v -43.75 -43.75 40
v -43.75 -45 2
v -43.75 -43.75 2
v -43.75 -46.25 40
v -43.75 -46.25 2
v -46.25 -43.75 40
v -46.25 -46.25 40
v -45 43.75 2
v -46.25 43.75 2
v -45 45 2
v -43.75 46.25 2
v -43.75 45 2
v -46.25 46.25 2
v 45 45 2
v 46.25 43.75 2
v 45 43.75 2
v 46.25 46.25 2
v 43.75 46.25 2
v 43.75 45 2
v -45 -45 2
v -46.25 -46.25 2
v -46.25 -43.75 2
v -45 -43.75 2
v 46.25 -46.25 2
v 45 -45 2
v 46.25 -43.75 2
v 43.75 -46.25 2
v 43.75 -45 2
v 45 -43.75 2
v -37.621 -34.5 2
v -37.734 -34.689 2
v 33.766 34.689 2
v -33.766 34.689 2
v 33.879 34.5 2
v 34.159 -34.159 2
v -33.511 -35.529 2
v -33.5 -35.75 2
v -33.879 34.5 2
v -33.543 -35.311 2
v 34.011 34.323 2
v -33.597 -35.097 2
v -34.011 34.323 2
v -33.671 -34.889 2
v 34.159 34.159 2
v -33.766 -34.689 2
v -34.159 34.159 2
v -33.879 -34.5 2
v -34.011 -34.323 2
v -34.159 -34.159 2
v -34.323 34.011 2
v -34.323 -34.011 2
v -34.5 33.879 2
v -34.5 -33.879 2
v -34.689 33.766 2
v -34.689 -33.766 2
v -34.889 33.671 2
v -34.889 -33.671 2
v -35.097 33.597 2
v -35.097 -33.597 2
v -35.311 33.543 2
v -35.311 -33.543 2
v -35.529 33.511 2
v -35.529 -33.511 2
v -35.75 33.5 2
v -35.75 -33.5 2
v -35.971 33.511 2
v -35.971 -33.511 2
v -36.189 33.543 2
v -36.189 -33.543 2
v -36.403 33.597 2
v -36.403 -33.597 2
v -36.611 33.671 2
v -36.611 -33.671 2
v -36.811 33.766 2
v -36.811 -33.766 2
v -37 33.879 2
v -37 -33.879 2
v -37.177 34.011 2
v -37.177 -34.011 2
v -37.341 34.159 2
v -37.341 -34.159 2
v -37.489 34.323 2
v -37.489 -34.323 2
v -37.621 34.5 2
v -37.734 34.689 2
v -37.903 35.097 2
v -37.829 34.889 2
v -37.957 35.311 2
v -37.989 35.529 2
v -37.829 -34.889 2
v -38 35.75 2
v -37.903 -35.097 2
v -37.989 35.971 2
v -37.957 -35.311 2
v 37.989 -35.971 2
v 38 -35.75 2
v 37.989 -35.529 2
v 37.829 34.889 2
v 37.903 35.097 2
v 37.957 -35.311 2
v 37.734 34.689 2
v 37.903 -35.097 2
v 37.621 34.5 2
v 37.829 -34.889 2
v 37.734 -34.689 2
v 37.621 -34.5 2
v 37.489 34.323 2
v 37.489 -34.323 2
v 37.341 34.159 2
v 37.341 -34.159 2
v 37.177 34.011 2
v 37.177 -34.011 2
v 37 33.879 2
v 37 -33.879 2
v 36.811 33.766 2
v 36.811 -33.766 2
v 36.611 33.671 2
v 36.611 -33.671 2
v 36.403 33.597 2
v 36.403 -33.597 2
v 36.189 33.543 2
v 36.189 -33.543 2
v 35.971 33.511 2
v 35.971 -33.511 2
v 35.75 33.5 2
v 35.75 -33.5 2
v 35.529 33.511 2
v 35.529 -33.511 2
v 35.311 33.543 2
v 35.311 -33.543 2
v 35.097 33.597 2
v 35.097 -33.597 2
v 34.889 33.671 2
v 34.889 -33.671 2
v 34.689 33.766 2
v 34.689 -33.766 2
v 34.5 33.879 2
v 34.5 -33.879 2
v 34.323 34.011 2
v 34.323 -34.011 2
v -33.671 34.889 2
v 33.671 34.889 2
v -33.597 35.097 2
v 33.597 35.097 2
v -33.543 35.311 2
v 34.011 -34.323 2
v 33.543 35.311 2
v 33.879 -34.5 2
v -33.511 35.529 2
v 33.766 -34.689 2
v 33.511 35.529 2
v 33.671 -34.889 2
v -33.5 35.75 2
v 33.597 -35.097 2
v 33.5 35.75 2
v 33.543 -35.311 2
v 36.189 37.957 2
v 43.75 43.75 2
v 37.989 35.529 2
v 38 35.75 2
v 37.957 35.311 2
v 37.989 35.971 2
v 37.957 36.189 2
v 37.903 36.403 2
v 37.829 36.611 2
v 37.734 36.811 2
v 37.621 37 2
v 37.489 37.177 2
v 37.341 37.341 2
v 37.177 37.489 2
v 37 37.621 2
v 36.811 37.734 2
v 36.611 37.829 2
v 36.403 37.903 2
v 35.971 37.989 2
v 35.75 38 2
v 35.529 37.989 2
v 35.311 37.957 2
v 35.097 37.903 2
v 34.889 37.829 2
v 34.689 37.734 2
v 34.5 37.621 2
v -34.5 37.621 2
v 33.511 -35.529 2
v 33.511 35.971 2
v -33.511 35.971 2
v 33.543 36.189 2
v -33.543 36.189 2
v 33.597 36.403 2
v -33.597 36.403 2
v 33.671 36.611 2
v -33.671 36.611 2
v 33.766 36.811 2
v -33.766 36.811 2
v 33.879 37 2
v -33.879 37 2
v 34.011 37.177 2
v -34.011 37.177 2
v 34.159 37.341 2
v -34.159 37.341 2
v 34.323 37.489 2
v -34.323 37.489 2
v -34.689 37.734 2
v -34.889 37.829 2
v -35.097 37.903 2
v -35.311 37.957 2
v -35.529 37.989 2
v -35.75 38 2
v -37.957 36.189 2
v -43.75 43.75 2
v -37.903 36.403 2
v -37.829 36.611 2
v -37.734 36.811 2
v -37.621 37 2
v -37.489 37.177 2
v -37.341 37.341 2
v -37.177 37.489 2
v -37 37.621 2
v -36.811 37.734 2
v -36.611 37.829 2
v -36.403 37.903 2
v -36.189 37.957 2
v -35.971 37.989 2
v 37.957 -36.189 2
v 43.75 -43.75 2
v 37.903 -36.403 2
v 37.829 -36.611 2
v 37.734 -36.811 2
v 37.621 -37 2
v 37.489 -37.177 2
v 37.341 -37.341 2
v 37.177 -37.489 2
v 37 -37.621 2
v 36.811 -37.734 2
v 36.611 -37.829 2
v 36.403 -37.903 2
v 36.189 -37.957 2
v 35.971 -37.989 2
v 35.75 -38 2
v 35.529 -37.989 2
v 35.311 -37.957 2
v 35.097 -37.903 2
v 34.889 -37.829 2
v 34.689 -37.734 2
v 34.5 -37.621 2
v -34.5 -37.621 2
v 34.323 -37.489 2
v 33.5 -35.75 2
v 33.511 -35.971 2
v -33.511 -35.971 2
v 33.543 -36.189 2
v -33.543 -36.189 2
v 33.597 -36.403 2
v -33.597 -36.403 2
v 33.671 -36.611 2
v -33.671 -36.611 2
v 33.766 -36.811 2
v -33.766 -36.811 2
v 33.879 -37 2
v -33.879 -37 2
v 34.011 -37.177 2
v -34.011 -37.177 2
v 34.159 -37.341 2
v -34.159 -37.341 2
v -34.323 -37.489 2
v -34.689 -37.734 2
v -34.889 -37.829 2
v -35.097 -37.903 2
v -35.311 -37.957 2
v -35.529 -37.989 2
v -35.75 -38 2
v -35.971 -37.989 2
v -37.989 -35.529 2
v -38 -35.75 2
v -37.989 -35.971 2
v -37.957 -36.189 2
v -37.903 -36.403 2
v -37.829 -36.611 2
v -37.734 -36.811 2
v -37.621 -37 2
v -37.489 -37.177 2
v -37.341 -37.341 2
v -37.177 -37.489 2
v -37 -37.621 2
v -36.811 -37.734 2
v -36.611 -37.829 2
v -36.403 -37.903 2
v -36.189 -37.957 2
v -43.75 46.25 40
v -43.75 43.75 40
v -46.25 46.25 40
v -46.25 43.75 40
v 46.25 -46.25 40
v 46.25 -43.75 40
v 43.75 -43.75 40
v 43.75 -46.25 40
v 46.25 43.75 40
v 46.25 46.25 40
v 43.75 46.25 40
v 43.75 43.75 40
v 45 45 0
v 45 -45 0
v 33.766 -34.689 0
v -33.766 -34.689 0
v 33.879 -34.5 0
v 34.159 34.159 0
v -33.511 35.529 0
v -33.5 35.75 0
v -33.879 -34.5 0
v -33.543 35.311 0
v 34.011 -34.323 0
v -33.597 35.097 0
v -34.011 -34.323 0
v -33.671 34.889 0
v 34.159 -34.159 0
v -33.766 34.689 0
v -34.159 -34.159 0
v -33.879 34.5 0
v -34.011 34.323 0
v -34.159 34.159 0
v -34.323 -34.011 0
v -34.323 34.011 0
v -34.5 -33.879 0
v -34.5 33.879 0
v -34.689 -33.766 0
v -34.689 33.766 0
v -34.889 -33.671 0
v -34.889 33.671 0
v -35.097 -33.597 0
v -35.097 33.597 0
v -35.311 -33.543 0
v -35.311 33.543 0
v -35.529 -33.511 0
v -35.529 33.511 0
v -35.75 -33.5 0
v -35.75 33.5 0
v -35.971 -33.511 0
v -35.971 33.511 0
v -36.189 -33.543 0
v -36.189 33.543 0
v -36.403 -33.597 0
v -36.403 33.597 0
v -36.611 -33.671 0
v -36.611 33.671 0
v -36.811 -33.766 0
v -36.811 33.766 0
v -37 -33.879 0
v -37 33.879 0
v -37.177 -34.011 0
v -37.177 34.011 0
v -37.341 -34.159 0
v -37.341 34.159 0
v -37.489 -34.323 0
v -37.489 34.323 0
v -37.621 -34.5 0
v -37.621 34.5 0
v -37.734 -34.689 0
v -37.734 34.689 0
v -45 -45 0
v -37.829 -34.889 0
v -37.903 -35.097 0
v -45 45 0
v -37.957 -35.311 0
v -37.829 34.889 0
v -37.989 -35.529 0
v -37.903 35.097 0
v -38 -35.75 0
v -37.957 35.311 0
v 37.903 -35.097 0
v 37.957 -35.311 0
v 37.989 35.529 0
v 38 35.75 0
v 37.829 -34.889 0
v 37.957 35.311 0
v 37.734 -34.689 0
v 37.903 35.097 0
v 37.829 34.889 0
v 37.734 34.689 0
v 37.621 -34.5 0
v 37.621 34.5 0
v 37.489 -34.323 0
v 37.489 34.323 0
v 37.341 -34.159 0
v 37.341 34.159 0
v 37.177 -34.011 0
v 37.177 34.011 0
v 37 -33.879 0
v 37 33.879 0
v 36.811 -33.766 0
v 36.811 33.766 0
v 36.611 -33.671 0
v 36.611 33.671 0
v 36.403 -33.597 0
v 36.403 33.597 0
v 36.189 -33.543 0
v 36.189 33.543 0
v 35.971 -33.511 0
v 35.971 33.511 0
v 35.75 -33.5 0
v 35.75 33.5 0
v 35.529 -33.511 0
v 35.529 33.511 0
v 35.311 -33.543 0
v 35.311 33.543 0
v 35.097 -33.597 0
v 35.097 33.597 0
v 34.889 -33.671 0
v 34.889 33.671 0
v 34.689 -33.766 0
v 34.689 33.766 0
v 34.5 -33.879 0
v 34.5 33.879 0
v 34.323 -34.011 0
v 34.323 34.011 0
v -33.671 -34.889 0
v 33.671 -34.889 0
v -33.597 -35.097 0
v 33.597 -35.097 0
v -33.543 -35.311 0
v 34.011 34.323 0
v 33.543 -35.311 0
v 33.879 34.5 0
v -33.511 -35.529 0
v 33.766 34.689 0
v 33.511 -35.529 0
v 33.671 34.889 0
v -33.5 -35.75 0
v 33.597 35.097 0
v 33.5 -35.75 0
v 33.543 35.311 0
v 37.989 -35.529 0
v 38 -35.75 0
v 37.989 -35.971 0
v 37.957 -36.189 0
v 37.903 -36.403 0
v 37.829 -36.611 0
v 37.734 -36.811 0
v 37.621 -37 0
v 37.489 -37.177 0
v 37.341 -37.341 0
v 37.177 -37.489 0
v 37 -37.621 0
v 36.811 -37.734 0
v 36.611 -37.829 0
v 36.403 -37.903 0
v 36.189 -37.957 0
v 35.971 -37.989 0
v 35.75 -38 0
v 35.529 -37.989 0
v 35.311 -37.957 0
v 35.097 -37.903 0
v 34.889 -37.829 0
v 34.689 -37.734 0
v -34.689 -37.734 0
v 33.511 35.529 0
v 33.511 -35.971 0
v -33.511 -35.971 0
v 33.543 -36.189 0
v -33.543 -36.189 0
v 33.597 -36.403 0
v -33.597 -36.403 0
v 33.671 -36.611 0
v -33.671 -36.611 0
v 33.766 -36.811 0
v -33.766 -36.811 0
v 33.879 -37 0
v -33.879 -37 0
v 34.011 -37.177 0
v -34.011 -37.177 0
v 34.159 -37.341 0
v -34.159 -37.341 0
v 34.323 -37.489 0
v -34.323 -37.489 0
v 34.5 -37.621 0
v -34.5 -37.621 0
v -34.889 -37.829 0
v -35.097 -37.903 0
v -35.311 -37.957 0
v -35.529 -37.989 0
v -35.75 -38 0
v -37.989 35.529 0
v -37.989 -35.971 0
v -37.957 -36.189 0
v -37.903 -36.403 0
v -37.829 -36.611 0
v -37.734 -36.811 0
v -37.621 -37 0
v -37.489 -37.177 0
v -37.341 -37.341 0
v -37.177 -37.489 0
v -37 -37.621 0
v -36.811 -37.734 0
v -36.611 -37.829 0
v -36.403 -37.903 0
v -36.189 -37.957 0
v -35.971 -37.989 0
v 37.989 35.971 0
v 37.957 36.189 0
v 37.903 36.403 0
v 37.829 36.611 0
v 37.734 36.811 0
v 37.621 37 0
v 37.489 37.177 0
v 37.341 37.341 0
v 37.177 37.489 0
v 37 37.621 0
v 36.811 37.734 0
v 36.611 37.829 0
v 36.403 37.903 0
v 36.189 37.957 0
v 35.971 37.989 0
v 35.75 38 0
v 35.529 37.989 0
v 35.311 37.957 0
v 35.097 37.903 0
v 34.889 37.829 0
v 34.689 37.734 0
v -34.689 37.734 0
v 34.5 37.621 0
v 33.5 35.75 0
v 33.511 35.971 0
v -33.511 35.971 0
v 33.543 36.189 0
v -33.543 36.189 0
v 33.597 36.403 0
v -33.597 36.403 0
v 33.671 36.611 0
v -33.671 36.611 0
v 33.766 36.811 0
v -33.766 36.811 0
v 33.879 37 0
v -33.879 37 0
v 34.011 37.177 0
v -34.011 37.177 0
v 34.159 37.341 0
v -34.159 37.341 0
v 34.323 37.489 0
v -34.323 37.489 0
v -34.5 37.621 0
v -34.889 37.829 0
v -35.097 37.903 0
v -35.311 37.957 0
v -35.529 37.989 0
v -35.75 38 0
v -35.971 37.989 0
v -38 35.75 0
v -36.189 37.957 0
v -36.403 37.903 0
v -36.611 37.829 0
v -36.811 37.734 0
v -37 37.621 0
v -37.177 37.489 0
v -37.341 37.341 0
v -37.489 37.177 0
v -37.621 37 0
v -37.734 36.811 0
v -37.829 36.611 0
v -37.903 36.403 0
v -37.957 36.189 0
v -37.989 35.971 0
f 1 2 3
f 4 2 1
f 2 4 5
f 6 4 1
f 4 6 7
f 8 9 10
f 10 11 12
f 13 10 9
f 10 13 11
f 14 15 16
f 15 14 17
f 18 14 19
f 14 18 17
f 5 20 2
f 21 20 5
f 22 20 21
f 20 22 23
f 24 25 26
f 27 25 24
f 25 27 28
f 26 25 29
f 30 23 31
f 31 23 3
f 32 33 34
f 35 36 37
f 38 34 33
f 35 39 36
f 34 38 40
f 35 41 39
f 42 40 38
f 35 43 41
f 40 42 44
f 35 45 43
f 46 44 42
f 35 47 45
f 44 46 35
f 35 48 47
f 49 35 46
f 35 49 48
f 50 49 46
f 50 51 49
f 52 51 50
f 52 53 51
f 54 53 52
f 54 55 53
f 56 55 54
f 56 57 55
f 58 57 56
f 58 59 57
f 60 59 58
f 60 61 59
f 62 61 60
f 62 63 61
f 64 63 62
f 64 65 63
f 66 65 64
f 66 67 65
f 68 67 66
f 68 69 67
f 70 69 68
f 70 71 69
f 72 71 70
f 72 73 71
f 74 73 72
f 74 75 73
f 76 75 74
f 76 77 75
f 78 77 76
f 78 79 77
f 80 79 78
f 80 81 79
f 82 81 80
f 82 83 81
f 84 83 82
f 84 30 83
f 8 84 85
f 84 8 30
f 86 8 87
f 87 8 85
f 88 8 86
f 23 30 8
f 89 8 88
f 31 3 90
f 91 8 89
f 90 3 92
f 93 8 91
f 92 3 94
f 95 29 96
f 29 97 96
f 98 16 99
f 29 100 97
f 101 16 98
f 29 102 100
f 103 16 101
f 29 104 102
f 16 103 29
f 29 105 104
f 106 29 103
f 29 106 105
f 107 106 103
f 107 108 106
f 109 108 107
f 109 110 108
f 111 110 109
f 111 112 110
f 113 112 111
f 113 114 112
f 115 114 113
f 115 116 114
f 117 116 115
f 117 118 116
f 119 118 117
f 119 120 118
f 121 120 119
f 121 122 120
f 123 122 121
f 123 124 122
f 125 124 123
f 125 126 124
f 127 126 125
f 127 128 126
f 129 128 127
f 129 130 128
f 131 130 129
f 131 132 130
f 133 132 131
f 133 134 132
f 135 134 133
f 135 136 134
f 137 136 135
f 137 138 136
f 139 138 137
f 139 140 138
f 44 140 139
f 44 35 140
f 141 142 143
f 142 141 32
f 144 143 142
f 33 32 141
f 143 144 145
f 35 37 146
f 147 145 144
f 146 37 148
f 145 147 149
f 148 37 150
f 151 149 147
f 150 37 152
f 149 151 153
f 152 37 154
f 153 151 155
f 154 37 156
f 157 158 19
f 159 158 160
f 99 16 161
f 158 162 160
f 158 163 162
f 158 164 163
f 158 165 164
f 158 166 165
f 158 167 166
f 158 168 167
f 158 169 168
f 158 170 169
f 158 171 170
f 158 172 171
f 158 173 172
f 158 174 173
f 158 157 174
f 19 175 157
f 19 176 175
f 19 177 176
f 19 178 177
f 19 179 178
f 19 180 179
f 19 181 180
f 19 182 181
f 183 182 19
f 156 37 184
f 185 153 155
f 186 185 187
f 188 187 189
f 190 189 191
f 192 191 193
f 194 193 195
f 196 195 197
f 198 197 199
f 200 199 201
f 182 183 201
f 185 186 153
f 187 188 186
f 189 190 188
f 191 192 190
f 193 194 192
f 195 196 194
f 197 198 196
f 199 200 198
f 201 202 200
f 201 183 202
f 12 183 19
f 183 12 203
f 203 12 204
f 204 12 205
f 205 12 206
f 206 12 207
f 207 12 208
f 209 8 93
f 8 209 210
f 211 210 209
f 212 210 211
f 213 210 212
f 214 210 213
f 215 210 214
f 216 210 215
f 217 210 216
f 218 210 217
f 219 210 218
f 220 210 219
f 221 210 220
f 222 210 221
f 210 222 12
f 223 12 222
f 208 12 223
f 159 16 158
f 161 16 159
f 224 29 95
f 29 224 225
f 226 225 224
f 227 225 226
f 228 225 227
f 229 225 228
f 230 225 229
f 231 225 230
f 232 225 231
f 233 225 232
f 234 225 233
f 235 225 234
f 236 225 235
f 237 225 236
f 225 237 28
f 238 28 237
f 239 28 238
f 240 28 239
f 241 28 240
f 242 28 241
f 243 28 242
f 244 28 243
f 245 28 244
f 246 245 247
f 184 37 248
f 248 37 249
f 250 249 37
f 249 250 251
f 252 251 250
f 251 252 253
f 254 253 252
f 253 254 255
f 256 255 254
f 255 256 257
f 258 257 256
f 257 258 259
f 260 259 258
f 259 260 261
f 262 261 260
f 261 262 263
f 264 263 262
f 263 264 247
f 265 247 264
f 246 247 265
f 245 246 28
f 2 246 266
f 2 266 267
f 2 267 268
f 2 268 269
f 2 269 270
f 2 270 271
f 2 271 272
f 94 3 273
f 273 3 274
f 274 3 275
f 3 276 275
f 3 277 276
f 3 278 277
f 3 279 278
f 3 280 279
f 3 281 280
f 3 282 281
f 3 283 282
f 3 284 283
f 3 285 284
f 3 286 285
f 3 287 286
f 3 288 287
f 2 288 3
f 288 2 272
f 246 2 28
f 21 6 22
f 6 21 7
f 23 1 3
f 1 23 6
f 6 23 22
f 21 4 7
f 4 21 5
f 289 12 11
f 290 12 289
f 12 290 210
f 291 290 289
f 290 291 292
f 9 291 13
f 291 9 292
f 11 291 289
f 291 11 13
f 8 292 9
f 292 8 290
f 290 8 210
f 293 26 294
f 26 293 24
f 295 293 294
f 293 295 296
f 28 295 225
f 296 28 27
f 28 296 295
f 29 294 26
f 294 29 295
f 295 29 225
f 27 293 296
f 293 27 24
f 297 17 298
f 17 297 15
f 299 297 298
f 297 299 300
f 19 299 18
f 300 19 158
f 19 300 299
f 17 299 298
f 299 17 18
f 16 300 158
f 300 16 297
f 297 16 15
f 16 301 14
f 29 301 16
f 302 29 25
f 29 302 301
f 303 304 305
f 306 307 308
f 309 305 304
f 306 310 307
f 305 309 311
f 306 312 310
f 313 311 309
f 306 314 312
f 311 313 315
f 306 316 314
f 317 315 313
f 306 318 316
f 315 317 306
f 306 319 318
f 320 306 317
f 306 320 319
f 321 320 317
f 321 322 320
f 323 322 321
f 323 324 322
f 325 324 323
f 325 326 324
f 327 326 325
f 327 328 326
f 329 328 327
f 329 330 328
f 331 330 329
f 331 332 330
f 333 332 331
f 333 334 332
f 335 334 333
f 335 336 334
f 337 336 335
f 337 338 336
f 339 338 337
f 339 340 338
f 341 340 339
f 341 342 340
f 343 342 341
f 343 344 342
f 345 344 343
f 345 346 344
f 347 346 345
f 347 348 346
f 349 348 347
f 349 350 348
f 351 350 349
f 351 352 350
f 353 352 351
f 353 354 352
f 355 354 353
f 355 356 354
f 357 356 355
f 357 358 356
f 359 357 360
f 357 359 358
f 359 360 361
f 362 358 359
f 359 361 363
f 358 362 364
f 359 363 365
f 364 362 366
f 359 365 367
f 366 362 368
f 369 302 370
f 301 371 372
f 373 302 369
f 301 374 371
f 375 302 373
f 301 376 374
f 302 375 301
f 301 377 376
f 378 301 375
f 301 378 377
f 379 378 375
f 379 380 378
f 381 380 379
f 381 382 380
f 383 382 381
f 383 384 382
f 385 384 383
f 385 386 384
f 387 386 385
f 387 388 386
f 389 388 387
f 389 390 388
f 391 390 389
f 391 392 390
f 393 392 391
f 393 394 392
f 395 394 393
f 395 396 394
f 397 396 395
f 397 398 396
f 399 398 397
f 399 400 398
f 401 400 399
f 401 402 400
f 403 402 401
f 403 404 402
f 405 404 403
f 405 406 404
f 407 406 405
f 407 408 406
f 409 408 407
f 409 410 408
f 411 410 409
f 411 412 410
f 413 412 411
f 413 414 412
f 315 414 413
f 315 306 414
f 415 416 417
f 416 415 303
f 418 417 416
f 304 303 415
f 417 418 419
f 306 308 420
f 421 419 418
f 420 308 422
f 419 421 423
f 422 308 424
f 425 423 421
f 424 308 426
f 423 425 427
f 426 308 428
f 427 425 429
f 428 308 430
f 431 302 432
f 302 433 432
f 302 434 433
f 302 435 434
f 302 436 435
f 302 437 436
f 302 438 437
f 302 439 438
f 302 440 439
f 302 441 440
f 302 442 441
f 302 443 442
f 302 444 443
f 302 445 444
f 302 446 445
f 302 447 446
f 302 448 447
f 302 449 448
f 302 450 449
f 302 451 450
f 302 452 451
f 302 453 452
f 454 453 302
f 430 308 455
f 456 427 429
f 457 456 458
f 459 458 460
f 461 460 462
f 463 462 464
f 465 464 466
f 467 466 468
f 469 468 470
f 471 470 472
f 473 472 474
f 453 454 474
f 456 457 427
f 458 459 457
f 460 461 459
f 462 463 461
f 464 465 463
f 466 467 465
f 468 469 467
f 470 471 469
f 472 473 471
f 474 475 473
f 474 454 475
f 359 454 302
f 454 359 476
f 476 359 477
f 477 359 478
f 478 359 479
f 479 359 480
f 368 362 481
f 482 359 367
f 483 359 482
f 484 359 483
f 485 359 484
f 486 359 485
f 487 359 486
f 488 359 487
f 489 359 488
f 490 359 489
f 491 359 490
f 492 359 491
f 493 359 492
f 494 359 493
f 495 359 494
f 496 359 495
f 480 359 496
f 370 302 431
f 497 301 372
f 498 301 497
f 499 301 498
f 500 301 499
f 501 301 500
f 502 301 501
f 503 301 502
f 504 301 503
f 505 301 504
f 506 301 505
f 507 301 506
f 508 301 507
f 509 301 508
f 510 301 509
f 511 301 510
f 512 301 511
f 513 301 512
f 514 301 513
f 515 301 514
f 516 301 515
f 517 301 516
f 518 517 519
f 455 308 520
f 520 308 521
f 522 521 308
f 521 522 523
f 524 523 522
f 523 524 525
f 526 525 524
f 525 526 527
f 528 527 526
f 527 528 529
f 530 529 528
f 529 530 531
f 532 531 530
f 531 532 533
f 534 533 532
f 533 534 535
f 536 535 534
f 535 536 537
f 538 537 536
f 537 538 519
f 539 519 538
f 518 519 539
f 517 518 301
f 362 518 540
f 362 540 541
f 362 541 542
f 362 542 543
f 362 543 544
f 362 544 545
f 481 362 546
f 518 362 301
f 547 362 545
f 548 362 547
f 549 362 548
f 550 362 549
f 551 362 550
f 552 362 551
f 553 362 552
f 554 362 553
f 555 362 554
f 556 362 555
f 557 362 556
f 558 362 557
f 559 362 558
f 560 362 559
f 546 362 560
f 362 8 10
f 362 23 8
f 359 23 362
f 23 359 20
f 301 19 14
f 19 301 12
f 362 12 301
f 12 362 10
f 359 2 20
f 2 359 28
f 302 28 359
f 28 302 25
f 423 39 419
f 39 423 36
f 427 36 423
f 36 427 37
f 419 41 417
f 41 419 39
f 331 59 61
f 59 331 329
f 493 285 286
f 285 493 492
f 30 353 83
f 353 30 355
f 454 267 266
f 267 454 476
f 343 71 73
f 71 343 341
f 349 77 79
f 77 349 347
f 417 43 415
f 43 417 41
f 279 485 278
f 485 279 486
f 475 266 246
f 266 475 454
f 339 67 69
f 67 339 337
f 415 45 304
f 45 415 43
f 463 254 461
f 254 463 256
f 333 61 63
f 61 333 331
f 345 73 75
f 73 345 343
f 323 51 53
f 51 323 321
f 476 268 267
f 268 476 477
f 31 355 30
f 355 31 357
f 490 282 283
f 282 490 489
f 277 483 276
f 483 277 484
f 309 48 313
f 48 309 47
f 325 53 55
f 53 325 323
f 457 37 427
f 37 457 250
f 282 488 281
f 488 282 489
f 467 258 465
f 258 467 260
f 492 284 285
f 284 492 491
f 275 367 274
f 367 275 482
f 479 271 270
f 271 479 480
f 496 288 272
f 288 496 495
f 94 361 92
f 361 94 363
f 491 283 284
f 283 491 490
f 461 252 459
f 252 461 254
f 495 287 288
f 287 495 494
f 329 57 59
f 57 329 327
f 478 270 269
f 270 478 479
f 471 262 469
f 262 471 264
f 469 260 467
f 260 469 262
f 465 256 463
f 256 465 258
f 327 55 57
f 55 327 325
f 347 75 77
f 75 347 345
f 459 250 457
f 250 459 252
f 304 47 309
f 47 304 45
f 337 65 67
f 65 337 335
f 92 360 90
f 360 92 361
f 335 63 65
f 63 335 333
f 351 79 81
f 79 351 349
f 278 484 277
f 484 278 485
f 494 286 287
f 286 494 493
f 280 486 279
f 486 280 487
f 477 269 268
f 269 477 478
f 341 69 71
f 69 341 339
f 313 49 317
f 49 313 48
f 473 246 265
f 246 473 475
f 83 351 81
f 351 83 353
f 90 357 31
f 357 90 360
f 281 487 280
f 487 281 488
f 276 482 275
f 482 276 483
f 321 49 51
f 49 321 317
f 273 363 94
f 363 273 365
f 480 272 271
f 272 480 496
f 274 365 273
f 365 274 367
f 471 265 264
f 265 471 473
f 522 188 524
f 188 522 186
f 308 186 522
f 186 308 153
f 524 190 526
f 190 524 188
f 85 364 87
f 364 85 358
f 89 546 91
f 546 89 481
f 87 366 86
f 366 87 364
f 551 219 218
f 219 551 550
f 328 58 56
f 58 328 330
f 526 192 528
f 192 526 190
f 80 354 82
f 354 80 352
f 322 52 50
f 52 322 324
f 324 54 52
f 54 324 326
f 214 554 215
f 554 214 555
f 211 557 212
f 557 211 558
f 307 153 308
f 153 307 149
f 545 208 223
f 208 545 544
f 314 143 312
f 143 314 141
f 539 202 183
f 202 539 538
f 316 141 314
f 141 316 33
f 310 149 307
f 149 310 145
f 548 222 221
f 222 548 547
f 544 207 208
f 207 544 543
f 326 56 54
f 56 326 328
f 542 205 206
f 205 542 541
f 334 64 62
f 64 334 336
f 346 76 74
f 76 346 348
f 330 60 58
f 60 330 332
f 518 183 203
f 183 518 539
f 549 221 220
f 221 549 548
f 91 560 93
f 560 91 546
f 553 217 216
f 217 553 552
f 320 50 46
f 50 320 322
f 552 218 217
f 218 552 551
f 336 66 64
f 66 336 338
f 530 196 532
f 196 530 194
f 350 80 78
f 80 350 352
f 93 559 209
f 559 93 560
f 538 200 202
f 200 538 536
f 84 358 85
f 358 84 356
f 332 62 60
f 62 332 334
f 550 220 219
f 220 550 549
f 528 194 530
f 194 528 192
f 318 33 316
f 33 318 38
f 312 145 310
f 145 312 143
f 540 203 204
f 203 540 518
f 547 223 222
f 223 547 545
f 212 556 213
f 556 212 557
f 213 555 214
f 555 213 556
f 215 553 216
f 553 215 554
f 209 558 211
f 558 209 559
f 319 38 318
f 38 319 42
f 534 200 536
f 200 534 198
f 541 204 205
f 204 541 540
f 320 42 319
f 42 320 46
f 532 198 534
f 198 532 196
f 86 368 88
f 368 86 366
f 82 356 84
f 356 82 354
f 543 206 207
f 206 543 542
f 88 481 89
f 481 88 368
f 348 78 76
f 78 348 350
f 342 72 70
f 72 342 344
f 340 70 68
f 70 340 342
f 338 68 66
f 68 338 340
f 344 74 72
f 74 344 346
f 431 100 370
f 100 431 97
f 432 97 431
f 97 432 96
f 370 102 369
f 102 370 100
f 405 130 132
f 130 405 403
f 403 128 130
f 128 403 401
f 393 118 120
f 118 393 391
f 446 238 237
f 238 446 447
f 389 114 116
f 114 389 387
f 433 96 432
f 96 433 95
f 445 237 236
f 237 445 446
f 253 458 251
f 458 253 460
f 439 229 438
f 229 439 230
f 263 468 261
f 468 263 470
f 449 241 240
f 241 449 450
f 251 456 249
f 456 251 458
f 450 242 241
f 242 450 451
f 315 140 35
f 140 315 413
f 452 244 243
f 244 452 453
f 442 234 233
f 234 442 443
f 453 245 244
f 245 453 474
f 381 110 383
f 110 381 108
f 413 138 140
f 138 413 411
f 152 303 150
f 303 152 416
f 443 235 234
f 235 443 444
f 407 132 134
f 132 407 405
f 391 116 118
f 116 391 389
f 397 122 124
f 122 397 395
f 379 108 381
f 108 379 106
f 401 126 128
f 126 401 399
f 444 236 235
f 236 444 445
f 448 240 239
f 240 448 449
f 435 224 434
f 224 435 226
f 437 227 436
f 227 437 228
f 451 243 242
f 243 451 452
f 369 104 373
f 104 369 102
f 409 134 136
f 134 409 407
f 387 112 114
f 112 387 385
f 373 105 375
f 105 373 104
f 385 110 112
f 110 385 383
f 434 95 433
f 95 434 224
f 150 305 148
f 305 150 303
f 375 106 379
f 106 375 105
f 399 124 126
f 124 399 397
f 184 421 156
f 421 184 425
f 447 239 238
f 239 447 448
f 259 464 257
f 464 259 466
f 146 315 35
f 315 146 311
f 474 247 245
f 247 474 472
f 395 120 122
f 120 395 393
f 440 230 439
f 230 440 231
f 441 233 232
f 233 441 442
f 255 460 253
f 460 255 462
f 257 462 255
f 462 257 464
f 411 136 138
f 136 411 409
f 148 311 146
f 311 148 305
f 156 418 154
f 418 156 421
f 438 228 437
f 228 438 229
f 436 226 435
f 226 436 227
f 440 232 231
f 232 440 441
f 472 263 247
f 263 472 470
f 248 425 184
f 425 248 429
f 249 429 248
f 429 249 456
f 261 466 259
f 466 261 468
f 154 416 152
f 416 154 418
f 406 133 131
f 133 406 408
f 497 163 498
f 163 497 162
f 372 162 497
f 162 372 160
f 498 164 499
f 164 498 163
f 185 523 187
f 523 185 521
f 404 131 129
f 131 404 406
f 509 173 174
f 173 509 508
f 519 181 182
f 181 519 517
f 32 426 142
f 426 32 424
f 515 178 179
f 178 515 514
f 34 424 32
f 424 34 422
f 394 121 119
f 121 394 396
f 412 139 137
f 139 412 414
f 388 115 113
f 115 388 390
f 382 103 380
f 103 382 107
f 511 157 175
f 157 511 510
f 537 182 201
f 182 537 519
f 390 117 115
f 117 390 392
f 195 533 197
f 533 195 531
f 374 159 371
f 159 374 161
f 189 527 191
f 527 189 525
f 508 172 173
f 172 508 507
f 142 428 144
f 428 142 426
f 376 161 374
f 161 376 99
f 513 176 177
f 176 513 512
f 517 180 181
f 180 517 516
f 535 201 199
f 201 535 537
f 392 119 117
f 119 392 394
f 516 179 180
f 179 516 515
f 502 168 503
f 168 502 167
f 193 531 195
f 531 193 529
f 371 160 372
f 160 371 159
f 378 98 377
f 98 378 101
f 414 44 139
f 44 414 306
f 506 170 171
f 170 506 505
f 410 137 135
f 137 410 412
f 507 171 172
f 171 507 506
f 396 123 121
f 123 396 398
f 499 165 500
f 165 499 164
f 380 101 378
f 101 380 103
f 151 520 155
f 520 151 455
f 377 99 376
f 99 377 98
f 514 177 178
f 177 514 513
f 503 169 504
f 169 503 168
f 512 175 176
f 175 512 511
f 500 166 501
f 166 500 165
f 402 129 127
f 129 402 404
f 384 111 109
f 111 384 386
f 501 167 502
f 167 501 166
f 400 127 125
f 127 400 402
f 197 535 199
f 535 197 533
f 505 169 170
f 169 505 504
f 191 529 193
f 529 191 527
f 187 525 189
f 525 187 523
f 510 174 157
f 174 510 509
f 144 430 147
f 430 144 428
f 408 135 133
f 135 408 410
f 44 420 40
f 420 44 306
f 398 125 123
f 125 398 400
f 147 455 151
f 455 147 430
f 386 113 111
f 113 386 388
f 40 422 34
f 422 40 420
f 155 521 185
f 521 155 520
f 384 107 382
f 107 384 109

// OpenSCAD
// DIY magnetic stirrer housing - print orientation (upside down)
// Units: mm

// ---------- Parameters ----------
top_thickness      = 2;     // top plate thickness (z = 0 to 2)
wall_thickness     = 2.5;   // wall thickness
box_height         = 40;    // total height of box (open at top)
outer_size         = 90;    // outer X and Y size of box
screw_hole_d       = 4.5;   // M4 screw hole diameter
screw_hole_pitch   = 71.5;  // square pattern diagonal (centre to centre)
cable_notch_w      = 12;    // cable notch width
cable_notch_depth  = 8;     // cable notch depth from open edge (z = 32 to 40)
eps                = 0.5;   // cutter overshoot past faces

$fn = 64;

// ---------- Model ----------
difference() {
    union() {
        // Top plate (lies on bed)
        translate([-outer_size/2, -outer_size/2, 0])
            cube([outer_size, outer_size, top_thickness]);

        // Four walls rising from plate to open top
        for (x = [-outer_size/2, outer_size/2])
            for (y = [-outer_size/2, outer_size/2])
                translate([x - wall_thickness/2, y - wall_thickness/2, top_thickness])
                    cube([wall_thickness, wall_thickness, box_height - top_thickness]);
    }

    // Four M4 screw holes through top plate, centred square pattern
    for (sx = [-1, 1], sy = [-1, 1])
        translate([sx * screw_hole_pitch/2, sy * screw_hole_pitch/2, -eps])
            cylinder(d = screw_hole_d, h = top_thickness + 2*eps);

    // Cable notch in one wall: 12 mm wide, centred along wall,
    // reaching 8 mm down from open edge (z = 32 to z = 40)
    translate([-outer_size/2 + wall_thickness/2, 0, box_height - cable_notch_depth])
        cube([cable_notch_w, outer_size/2 - wall_thickness/2 - eps, cable_notch_depth + eps]);
}
